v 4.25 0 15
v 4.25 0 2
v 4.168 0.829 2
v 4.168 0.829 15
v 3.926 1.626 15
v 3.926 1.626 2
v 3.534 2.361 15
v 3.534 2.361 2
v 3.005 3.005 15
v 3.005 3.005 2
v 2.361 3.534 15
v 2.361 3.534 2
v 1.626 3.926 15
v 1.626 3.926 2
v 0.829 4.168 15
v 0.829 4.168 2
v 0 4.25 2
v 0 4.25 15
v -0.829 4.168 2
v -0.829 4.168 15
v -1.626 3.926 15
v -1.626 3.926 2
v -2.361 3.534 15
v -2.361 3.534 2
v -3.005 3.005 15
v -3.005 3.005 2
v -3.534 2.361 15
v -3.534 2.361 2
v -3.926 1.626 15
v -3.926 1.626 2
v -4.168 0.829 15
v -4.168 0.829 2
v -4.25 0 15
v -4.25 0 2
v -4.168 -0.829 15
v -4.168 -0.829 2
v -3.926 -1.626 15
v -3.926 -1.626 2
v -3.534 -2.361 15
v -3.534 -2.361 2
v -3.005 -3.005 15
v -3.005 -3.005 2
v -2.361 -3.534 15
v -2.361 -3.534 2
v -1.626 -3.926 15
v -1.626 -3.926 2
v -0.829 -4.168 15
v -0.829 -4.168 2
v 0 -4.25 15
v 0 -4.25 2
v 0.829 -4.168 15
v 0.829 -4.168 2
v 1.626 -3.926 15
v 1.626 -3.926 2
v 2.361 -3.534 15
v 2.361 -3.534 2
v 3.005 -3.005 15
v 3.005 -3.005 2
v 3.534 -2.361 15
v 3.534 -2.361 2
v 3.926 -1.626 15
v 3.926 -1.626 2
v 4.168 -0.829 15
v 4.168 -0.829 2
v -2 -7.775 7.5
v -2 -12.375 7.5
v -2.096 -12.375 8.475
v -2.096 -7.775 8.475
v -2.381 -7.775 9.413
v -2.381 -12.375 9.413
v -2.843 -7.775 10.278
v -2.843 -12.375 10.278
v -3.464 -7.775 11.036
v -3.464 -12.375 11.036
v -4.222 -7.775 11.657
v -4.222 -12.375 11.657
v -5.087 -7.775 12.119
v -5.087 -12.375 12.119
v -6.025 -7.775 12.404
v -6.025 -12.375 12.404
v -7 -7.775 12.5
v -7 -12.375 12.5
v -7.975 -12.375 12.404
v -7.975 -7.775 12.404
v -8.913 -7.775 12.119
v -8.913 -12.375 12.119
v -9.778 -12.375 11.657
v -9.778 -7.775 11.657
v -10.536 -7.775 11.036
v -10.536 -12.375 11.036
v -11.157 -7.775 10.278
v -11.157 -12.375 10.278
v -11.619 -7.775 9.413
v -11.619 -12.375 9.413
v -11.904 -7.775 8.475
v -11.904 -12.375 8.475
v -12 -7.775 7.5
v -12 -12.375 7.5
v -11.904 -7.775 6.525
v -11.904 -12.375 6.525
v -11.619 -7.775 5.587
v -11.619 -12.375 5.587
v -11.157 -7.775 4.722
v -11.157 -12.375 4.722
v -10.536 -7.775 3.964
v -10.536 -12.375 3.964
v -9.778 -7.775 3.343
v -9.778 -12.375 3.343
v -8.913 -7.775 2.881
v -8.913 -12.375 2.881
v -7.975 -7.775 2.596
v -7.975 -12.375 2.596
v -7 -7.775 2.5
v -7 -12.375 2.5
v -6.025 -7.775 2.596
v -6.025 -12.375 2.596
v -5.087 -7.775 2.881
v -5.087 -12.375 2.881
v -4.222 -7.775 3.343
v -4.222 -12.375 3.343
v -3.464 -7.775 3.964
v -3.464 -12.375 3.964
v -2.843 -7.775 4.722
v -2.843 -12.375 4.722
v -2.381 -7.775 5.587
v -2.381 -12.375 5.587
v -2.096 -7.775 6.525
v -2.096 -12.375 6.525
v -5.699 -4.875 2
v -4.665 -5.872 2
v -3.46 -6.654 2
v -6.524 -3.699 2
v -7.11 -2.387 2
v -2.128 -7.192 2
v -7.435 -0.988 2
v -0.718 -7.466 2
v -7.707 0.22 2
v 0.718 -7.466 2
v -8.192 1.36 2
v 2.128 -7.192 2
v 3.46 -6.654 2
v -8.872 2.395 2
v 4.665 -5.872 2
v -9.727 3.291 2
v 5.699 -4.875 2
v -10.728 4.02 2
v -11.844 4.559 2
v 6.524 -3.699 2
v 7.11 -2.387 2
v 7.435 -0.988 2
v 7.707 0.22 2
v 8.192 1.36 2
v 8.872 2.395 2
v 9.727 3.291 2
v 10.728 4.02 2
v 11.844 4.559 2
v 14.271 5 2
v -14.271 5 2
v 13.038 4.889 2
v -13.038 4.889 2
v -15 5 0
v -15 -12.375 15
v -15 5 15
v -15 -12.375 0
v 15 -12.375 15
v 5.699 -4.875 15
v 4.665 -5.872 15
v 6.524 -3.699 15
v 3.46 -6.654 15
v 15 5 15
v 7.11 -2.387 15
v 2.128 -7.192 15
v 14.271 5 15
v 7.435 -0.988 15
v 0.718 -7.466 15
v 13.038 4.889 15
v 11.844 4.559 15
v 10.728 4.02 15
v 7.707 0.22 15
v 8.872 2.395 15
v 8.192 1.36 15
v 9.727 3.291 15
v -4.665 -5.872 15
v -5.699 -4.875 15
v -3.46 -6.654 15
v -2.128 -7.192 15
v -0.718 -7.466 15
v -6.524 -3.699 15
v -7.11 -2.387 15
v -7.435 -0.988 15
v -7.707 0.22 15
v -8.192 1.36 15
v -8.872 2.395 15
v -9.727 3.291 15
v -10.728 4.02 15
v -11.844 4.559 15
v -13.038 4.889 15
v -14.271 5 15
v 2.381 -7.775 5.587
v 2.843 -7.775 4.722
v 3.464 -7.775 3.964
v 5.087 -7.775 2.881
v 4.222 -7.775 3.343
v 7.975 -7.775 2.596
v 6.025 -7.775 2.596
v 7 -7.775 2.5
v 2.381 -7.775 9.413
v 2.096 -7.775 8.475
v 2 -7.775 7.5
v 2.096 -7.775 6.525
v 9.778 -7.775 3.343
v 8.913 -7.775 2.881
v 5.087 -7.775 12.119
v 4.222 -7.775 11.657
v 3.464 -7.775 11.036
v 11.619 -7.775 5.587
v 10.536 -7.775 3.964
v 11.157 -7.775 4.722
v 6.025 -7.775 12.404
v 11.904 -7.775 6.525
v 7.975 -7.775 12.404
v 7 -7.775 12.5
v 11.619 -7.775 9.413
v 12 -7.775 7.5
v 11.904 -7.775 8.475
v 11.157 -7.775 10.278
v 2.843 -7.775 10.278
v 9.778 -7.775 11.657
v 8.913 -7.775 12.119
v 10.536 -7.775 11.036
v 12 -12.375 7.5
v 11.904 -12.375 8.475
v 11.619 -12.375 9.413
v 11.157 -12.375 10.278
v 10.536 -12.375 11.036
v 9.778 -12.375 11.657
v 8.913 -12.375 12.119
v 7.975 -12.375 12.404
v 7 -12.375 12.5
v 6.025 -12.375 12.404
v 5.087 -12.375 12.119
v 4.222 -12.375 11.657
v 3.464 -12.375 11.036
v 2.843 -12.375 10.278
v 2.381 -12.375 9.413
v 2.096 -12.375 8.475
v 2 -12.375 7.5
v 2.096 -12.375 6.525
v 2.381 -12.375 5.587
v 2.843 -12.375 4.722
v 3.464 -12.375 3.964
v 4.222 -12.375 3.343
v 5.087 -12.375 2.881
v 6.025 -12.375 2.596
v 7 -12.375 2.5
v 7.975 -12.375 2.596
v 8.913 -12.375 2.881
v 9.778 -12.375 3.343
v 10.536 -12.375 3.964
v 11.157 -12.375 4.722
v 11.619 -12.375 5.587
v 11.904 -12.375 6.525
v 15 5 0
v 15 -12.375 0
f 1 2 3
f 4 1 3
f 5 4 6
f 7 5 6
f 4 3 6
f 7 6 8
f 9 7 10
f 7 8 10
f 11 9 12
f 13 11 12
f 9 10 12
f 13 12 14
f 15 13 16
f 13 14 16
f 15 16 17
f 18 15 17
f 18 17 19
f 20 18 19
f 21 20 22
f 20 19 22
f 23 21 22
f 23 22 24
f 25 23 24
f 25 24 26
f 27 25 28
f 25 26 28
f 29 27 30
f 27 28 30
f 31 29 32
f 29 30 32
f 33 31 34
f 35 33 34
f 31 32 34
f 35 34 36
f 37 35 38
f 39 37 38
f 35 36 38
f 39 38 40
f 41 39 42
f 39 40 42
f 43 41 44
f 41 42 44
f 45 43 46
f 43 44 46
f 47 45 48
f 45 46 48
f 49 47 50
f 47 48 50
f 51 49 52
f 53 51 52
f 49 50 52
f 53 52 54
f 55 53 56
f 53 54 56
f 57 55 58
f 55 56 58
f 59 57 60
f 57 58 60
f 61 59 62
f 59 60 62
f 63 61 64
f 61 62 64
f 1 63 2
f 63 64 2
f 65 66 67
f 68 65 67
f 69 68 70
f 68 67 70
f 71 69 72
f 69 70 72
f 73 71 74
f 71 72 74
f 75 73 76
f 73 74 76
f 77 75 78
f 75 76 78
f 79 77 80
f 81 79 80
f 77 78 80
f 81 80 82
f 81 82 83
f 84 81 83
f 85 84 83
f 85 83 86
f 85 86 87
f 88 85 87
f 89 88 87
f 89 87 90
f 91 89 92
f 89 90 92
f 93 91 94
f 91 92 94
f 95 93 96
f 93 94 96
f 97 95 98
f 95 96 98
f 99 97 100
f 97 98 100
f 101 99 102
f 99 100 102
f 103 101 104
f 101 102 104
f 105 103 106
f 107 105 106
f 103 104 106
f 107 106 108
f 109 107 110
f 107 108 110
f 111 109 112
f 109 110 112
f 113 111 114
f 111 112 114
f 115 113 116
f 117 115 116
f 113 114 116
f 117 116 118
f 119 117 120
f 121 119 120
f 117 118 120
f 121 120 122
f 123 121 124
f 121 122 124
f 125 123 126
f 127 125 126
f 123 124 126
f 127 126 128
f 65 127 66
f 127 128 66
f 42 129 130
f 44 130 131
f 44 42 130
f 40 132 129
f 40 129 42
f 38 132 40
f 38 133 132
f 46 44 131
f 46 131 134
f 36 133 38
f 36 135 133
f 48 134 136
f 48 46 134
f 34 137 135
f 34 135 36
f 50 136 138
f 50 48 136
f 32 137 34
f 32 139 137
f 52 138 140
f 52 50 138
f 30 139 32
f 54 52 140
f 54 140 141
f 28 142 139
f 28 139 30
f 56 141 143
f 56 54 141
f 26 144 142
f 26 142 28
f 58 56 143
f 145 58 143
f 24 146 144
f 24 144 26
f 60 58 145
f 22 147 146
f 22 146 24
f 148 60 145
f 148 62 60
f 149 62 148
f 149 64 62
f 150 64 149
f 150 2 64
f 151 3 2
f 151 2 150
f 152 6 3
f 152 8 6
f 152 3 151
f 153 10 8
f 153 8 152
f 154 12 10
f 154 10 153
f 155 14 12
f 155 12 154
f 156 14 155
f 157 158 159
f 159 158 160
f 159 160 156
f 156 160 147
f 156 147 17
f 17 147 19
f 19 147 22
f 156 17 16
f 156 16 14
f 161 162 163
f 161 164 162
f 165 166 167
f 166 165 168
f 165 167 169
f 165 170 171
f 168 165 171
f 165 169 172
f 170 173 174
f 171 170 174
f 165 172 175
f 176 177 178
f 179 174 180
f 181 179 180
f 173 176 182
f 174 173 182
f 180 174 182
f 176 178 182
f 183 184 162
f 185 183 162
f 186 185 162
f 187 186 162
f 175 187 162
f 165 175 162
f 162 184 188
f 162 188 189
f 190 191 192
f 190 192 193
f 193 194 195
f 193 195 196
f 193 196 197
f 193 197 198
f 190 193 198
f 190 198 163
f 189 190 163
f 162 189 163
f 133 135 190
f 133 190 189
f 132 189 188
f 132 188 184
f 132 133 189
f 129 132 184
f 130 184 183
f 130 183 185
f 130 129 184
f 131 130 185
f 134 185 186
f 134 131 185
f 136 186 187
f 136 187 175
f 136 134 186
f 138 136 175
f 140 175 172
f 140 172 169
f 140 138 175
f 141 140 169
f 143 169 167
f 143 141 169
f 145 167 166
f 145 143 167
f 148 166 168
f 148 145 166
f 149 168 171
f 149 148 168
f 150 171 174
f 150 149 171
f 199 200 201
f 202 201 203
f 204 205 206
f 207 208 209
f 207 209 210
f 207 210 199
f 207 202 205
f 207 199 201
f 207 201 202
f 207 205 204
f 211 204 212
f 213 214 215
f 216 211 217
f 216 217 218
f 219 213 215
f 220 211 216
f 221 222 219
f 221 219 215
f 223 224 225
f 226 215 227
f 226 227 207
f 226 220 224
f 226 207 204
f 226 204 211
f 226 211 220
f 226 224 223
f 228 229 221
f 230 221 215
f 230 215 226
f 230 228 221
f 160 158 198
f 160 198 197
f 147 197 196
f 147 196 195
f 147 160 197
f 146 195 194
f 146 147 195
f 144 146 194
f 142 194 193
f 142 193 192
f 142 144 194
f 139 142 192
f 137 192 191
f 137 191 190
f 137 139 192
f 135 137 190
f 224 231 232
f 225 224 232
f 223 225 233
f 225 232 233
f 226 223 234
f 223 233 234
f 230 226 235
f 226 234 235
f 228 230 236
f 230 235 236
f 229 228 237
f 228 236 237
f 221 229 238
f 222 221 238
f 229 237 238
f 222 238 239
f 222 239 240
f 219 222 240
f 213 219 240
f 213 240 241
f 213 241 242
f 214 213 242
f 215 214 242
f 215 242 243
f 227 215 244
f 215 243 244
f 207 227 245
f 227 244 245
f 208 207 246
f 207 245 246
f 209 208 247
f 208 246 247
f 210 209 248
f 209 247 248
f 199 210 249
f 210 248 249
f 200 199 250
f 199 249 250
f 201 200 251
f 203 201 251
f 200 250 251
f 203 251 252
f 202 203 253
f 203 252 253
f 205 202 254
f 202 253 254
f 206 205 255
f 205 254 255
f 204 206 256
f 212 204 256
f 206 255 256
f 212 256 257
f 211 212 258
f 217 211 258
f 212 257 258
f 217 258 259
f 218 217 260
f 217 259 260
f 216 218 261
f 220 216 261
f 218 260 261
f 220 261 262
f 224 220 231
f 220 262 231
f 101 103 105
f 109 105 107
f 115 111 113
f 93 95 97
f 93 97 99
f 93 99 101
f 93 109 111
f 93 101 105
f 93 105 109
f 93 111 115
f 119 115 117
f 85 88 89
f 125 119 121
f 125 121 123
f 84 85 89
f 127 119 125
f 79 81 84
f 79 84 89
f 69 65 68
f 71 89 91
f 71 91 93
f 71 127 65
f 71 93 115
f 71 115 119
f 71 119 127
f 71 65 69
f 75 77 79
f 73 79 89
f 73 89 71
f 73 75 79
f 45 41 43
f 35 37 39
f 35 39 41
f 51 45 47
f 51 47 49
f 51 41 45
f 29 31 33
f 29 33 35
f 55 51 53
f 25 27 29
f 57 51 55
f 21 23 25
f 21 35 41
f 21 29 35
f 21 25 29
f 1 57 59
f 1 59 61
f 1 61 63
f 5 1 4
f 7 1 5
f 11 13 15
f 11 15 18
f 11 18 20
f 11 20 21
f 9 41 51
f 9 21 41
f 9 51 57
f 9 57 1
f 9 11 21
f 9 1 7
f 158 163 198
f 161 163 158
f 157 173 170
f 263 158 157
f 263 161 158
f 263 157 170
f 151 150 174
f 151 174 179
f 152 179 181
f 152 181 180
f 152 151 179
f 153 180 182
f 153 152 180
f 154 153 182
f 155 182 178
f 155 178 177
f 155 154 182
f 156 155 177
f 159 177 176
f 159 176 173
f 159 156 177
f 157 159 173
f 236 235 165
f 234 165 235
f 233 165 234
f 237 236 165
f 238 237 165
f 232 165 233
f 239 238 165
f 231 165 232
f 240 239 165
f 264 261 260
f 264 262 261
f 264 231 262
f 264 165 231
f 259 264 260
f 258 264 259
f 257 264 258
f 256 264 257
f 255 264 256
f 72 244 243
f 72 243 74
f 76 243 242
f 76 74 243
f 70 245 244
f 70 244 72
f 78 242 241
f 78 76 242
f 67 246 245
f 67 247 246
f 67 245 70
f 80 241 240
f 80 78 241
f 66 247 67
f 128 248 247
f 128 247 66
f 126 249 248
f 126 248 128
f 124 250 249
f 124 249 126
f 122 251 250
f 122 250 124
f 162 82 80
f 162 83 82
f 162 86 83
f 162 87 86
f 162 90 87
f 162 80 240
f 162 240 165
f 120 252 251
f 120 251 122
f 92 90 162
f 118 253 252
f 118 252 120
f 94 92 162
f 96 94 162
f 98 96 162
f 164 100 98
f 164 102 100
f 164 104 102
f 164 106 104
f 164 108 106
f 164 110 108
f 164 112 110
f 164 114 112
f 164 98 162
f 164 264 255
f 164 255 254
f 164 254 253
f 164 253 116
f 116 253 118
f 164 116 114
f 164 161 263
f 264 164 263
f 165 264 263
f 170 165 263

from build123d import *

# Parameters (mm, degrees)
CROQUIS2_W              = 30
CROQUIS2_H              = 17.375045376
SALIENTE_EXTRUIR1_DEPTH = 2
CROQUIS3_R              = 4.25
SALIENTE_EXTRUIR2_DEPTH = 13
CROQUIS4_R              = 5
CORTAR_EXTRUIR1_DEPTH   = 4.6


with BuildPart() as part:
    # Croquis2 → Saliente-Extruir1 (new body)
    with BuildSketch(Plane.XY):
        with Locations((0, -3.687522688)):
            Rectangle(CROQUIS2_W, CROQUIS2_H)
    extrude(amount=SALIENTE_EXTRUIR1_DEPTH)

    # Croquis3 → Saliente-Extruir2 (add)
    with BuildSketch(Plane.XY.offset(2)):
        Circle(CROQUIS3_R)
        with BuildLine():
            Line((-15, 5), (-14.271293534, 5))
            ThreePointArc((-14.271293534, 5), (-9.727126272, 3.291298824), (-7.434621256, -0.98813298))
            ThreePointArc((-7.434621256, -0.98813298), (0, -7.5), (7.434621256, -0.98813298))
            ThreePointArc((7.434621256, -0.98813298), (9.727126272, 3.291298824), (14.271293534, 5))
            Line((14.271293534, 5), (15, 5))
            Line((15, 5), (15, -12.375045376))
            Line((15, -12.375045376), (-15, -12.375045376))
            Line((-15, -12.375045376), (-15, 5))
        make_face()
    extrude(amount=SALIENTE_EXTRUIR2_DEPTH)

    # Croquis4 → Cortar-Extruir1 (cut)
    with BuildSketch(Plane.XZ.offset(12.375045376)):
        with Locations((-7, 7.5)):
            Circle(CROQUIS4_R)
        with Locations((7, 7.5)):
            Circle(CROQUIS4_R)
    extrude(amount=-CORTAR_EXTRUIR1_DEPTH, mode=Mode.SUBTRACT)


solid = part.part
